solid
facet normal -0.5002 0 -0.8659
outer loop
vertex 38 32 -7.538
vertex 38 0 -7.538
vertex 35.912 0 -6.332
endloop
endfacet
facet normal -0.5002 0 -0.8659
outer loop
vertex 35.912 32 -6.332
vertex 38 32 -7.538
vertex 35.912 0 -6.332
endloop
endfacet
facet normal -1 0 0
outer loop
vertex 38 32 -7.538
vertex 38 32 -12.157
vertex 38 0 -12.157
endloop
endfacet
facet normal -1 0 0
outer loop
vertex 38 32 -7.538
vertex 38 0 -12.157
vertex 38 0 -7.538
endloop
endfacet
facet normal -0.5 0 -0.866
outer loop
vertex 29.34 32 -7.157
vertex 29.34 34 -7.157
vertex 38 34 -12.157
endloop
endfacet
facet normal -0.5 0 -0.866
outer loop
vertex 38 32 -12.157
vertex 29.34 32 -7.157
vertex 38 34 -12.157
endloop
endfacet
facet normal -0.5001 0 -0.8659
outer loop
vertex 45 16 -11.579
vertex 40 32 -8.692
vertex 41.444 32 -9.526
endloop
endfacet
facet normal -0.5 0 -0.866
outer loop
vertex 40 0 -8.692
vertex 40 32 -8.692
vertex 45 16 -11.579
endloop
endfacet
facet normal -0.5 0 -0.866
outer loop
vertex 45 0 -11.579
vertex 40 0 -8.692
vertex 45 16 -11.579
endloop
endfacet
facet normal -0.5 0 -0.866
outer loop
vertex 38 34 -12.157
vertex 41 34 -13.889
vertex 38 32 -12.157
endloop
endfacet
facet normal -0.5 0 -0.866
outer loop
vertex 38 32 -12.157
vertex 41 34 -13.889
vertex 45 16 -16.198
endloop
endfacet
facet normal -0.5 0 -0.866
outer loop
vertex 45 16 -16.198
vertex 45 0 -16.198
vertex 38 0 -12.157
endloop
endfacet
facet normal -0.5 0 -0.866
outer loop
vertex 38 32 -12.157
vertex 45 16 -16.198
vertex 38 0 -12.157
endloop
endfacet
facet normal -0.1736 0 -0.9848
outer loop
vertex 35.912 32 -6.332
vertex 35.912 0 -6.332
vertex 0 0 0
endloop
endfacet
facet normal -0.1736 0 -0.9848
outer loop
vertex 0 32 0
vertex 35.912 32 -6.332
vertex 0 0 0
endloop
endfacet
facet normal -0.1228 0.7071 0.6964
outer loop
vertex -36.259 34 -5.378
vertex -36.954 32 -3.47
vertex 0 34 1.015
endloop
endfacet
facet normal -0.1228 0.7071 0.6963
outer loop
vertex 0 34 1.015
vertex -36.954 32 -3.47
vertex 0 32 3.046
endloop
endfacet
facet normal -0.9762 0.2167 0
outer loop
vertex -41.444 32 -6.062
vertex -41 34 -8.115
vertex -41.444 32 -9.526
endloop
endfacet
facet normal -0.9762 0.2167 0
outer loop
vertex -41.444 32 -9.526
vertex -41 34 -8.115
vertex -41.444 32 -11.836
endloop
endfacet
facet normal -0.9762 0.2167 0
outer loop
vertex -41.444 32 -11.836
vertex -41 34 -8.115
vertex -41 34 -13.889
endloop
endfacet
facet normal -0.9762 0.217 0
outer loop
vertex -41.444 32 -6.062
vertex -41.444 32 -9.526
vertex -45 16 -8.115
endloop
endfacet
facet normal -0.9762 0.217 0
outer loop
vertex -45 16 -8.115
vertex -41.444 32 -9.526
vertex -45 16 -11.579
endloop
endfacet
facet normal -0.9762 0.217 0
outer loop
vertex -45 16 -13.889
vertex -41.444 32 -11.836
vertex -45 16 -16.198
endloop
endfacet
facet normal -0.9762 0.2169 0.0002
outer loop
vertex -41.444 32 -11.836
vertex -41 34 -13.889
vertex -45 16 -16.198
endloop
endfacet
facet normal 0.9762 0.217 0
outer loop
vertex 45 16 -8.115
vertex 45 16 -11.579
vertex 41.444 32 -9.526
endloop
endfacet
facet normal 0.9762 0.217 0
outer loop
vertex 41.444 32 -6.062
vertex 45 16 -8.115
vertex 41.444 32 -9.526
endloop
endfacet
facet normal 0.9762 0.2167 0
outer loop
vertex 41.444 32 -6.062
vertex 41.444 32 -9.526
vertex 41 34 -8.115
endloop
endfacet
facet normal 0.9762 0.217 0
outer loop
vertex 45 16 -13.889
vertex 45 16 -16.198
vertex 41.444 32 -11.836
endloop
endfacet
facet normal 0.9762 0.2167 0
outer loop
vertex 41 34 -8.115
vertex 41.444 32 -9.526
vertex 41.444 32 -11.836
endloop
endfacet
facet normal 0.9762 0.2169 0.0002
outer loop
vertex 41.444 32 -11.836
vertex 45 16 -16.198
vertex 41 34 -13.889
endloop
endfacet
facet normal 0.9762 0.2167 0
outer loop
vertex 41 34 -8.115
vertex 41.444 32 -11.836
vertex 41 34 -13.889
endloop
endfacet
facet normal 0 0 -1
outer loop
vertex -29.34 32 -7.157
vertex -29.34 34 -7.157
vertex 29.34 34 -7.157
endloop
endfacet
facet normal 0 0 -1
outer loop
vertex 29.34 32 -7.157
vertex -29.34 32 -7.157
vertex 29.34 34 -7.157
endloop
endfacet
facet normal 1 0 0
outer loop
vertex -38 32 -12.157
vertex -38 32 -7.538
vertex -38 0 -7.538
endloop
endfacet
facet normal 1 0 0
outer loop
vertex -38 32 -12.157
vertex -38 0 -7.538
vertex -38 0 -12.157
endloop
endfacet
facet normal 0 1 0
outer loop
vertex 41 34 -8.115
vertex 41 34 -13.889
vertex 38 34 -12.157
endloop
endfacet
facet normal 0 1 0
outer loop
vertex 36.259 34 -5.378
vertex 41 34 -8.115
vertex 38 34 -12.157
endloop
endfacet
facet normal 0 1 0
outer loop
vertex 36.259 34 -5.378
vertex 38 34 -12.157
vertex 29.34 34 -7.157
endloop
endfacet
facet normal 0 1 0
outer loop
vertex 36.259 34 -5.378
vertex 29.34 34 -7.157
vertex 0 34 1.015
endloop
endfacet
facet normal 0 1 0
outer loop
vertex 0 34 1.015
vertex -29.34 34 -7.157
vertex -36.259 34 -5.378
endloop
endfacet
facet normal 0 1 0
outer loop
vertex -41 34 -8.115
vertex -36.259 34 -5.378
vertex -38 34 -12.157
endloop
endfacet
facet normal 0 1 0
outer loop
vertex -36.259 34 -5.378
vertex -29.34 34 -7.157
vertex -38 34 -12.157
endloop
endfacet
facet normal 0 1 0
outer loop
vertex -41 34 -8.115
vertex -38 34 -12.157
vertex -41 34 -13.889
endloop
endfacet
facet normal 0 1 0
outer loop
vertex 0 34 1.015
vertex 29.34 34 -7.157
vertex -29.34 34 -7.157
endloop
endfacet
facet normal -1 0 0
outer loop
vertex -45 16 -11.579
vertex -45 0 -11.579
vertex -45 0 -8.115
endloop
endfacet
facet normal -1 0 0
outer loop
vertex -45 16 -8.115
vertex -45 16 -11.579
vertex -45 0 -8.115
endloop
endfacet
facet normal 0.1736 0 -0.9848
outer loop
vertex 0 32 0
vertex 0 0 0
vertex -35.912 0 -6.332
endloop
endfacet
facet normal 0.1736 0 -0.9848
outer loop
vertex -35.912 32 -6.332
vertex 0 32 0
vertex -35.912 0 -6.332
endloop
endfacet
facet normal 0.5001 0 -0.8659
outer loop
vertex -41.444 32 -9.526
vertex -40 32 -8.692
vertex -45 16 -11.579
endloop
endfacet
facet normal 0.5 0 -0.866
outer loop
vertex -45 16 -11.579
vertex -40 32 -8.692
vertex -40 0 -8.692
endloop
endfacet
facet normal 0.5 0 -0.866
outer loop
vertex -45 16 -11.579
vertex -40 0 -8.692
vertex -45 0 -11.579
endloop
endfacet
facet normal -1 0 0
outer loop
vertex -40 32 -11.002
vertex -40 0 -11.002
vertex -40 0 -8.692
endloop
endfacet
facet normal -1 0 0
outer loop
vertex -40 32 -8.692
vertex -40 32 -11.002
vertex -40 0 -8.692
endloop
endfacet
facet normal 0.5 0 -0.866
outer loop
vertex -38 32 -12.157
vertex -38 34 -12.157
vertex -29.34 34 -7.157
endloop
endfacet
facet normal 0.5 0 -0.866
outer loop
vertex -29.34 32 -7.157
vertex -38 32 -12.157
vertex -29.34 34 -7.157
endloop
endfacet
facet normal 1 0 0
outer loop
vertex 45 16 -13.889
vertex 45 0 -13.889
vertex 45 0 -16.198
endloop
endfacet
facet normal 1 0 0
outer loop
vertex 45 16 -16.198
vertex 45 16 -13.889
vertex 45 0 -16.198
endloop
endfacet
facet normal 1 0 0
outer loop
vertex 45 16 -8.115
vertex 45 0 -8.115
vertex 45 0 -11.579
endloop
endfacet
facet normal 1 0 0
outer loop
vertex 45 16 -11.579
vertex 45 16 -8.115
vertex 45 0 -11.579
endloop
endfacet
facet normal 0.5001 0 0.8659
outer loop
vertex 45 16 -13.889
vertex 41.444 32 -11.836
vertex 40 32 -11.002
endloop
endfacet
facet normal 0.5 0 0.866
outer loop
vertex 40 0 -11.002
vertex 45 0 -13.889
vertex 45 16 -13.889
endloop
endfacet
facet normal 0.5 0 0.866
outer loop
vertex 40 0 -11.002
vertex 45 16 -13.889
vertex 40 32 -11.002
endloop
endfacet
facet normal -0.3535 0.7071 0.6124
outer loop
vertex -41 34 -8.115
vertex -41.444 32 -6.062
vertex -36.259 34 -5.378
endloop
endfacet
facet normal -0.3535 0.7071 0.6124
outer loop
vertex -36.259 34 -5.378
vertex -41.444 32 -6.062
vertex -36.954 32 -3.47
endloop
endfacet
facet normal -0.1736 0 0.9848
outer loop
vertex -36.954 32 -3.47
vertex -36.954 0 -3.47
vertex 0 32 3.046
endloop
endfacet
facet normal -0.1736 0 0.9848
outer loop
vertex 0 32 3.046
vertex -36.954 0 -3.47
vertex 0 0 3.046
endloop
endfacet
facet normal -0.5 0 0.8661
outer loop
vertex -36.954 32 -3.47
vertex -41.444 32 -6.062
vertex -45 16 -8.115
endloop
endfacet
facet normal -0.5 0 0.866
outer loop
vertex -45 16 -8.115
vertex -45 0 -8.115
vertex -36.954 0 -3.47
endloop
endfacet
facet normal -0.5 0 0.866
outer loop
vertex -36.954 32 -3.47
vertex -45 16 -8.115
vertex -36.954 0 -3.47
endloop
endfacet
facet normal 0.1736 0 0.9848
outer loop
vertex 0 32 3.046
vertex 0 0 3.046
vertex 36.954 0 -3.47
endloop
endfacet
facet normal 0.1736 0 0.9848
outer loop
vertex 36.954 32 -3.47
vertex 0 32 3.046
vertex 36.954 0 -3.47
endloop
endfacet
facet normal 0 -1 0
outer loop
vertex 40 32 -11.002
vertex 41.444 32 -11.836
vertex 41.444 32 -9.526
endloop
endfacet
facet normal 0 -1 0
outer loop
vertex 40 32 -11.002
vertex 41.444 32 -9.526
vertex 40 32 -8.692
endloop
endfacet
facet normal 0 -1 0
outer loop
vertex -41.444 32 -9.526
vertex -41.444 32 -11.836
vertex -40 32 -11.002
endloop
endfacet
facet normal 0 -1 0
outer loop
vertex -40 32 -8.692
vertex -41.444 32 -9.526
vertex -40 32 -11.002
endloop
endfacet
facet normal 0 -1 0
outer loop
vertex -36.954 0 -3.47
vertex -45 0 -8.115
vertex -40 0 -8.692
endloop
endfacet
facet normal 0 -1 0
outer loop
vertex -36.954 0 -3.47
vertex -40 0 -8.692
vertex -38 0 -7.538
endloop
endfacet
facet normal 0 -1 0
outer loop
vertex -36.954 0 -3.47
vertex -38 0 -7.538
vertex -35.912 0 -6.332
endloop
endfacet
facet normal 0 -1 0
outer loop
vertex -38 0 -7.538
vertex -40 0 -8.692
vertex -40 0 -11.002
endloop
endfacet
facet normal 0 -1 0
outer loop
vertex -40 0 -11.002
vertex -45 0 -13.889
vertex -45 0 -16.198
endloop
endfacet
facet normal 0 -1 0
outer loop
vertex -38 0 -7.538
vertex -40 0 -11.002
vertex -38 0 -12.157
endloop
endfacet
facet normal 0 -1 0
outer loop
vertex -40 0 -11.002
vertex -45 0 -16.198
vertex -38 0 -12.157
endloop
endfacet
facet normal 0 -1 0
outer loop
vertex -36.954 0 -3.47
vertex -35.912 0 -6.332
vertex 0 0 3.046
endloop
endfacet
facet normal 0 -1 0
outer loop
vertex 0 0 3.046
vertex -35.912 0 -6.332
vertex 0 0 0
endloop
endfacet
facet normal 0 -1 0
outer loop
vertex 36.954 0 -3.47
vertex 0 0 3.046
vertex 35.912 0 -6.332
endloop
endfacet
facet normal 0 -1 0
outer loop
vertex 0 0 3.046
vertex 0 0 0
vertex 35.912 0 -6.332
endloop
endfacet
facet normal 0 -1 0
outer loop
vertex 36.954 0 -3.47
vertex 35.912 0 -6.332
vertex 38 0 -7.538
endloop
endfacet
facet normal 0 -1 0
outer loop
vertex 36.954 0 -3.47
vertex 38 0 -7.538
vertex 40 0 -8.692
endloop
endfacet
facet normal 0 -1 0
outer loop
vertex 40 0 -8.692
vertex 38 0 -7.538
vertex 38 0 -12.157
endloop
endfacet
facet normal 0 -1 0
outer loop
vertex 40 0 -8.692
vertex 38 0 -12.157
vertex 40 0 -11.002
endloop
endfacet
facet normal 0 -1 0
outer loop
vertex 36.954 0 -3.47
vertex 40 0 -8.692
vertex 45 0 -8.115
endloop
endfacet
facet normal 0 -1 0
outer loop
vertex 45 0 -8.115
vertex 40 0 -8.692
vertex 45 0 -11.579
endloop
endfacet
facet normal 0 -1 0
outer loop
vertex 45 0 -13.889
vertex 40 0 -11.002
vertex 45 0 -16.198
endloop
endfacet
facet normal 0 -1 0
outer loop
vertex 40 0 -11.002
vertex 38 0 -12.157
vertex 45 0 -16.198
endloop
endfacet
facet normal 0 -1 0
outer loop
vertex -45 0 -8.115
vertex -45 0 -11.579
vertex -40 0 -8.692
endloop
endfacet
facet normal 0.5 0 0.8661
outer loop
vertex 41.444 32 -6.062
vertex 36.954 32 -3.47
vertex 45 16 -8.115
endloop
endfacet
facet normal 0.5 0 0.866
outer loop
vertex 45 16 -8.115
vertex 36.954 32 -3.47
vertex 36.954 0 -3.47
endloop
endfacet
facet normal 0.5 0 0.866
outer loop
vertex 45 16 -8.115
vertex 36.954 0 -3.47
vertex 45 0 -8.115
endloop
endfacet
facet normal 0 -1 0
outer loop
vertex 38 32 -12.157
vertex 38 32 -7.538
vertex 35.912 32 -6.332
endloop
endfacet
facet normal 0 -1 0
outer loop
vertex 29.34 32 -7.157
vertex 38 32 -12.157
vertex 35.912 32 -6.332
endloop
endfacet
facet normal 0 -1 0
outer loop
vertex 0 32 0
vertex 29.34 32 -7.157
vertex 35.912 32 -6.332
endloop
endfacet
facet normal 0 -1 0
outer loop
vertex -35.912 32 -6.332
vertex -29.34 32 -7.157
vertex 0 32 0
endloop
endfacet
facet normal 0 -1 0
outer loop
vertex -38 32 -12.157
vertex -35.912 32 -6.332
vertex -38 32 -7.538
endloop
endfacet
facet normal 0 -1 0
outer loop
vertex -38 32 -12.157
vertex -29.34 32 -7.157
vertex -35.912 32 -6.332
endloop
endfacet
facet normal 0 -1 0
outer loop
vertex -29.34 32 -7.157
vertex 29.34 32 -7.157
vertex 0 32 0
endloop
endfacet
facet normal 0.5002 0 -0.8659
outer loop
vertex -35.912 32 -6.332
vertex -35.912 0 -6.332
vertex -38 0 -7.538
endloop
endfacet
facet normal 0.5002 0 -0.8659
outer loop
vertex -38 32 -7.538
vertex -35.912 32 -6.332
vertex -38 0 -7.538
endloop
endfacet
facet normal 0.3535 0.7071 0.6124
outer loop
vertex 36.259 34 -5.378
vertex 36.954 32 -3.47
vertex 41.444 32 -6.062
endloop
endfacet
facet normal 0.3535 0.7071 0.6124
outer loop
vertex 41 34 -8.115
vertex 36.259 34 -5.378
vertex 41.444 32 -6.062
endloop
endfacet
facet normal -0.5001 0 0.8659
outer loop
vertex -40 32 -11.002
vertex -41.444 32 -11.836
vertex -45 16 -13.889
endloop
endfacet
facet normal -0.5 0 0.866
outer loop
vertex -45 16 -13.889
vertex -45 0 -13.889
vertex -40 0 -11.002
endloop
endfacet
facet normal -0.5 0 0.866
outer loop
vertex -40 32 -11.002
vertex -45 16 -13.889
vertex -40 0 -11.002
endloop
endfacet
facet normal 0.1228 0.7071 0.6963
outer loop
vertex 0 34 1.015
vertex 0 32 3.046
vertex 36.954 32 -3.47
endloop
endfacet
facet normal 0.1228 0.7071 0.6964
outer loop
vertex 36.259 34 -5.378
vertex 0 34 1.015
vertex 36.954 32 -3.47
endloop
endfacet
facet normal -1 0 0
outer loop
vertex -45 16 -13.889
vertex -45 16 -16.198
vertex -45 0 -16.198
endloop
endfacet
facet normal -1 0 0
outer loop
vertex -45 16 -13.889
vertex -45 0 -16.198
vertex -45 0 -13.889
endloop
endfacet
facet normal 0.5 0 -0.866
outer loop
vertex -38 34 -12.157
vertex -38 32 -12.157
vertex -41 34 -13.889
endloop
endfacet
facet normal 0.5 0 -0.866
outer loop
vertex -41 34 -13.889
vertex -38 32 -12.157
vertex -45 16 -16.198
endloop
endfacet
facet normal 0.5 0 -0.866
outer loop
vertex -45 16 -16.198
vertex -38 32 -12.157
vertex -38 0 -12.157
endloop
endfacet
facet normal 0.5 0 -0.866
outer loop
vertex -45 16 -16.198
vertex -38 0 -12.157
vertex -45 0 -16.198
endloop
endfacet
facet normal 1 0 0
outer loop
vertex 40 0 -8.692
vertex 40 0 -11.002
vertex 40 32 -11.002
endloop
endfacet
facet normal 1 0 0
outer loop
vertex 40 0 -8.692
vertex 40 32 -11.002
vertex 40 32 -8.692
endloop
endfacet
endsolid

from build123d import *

# Parameters (mm, degrees)
BOSS_EXTRUDE2_DEPTH = 34
CUT_EXTRUDE2_DEPTH  = 32
BOSS_EXTRUDE3_DEPTH = 2
CHAMFER1_SIZE       = 2
CUT_EXTRUDE3_START  = -16.19797
CUT_EXTRUDE3_DEPTH  = 10.135705


with BuildPart() as part:
    # Sketch4 → Boss-Extrude2 (new body)
    with BuildSketch(Plane(origin=(0, 0, 0), x_dir=(1, 0, 0), z_dir=(0, 1, 0))):
        Polygon((-45, 16.197969794), (-45, 8.115066025), (-36.954004115, 3.469708135), (0, -3.046279836), (36.954004115, 3.469708135), (45, 8.115066025), (45, 16.197969794), (38, 12.156517909), (38, 7.537715756), (35.912115049, 6.332274817), (0, 0), (-35.912115049, 6.332274817), (-38, 7.537715756), (-38, 12.156517909), align=None)
    extrude(amount=BOSS_EXTRUDE2_DEPTH)

    # Sketch5 → Cut-Extrude2 (cut)
    with BuildSketch(Plane.XZ):
        Polygon((-40, -8.692416294), (-45, -11.57916764), (-45, -13.888568717), (-40, -11.001817371), align=None)
        Polygon((40, -8.692416294), (45, -11.57916764), (45, -13.888568717), (40, -11.001817371), align=None)
    extrude(amount=-CUT_EXTRUDE2_DEPTH, mode=Mode.SUBTRACT)

    # Sketch6 → Boss-Extrude3 (add)
    with BuildSketch(Plane(origin=(0, 34, 0), x_dir=(1, 0, 0), z_dir=(0, 1, 0))):
        Polygon((38, 12.156517909), (38, 7.537715756), (35.912115049, 6.332274817), (0, 0), (-35.912115049, 6.332274817), (-38, 7.537715756), (-38, 12.156517909), (-29.339745962, 7.156517909), (29.339745962, 7.156517909), align=None)
    extrude(amount=-BOSS_EXTRUDE3_DEPTH)

    # Chamfer1
    chamfer1_edges = [part.edges().sort_by_distance(p)[0] for p in [
        (-40.977002058, 34, -5.79238708),
        (-18.477002058, 34, -0.21171415),
        (18.477002058, 34, -0.21171415),
        (40.977002058, 34, -5.79238708),
    ]]
    chamfer(chamfer1_edges, length=CHAMFER1_SIZE)

    # Sketch7 → Cut-Extrude3 (cut)
    with BuildSketch(Plane.XY.offset(CUT_EXTRUDE3_START)):
        Polygon((-45, 16), (-45, 34), (-41, 34), align=None)
        Polygon((45, 16), (41, 34), (45, 34), align=None)
    extrude(amount=CUT_EXTRUDE3_DEPTH, mode=Mode.SUBTRACT)


solid = part.part
